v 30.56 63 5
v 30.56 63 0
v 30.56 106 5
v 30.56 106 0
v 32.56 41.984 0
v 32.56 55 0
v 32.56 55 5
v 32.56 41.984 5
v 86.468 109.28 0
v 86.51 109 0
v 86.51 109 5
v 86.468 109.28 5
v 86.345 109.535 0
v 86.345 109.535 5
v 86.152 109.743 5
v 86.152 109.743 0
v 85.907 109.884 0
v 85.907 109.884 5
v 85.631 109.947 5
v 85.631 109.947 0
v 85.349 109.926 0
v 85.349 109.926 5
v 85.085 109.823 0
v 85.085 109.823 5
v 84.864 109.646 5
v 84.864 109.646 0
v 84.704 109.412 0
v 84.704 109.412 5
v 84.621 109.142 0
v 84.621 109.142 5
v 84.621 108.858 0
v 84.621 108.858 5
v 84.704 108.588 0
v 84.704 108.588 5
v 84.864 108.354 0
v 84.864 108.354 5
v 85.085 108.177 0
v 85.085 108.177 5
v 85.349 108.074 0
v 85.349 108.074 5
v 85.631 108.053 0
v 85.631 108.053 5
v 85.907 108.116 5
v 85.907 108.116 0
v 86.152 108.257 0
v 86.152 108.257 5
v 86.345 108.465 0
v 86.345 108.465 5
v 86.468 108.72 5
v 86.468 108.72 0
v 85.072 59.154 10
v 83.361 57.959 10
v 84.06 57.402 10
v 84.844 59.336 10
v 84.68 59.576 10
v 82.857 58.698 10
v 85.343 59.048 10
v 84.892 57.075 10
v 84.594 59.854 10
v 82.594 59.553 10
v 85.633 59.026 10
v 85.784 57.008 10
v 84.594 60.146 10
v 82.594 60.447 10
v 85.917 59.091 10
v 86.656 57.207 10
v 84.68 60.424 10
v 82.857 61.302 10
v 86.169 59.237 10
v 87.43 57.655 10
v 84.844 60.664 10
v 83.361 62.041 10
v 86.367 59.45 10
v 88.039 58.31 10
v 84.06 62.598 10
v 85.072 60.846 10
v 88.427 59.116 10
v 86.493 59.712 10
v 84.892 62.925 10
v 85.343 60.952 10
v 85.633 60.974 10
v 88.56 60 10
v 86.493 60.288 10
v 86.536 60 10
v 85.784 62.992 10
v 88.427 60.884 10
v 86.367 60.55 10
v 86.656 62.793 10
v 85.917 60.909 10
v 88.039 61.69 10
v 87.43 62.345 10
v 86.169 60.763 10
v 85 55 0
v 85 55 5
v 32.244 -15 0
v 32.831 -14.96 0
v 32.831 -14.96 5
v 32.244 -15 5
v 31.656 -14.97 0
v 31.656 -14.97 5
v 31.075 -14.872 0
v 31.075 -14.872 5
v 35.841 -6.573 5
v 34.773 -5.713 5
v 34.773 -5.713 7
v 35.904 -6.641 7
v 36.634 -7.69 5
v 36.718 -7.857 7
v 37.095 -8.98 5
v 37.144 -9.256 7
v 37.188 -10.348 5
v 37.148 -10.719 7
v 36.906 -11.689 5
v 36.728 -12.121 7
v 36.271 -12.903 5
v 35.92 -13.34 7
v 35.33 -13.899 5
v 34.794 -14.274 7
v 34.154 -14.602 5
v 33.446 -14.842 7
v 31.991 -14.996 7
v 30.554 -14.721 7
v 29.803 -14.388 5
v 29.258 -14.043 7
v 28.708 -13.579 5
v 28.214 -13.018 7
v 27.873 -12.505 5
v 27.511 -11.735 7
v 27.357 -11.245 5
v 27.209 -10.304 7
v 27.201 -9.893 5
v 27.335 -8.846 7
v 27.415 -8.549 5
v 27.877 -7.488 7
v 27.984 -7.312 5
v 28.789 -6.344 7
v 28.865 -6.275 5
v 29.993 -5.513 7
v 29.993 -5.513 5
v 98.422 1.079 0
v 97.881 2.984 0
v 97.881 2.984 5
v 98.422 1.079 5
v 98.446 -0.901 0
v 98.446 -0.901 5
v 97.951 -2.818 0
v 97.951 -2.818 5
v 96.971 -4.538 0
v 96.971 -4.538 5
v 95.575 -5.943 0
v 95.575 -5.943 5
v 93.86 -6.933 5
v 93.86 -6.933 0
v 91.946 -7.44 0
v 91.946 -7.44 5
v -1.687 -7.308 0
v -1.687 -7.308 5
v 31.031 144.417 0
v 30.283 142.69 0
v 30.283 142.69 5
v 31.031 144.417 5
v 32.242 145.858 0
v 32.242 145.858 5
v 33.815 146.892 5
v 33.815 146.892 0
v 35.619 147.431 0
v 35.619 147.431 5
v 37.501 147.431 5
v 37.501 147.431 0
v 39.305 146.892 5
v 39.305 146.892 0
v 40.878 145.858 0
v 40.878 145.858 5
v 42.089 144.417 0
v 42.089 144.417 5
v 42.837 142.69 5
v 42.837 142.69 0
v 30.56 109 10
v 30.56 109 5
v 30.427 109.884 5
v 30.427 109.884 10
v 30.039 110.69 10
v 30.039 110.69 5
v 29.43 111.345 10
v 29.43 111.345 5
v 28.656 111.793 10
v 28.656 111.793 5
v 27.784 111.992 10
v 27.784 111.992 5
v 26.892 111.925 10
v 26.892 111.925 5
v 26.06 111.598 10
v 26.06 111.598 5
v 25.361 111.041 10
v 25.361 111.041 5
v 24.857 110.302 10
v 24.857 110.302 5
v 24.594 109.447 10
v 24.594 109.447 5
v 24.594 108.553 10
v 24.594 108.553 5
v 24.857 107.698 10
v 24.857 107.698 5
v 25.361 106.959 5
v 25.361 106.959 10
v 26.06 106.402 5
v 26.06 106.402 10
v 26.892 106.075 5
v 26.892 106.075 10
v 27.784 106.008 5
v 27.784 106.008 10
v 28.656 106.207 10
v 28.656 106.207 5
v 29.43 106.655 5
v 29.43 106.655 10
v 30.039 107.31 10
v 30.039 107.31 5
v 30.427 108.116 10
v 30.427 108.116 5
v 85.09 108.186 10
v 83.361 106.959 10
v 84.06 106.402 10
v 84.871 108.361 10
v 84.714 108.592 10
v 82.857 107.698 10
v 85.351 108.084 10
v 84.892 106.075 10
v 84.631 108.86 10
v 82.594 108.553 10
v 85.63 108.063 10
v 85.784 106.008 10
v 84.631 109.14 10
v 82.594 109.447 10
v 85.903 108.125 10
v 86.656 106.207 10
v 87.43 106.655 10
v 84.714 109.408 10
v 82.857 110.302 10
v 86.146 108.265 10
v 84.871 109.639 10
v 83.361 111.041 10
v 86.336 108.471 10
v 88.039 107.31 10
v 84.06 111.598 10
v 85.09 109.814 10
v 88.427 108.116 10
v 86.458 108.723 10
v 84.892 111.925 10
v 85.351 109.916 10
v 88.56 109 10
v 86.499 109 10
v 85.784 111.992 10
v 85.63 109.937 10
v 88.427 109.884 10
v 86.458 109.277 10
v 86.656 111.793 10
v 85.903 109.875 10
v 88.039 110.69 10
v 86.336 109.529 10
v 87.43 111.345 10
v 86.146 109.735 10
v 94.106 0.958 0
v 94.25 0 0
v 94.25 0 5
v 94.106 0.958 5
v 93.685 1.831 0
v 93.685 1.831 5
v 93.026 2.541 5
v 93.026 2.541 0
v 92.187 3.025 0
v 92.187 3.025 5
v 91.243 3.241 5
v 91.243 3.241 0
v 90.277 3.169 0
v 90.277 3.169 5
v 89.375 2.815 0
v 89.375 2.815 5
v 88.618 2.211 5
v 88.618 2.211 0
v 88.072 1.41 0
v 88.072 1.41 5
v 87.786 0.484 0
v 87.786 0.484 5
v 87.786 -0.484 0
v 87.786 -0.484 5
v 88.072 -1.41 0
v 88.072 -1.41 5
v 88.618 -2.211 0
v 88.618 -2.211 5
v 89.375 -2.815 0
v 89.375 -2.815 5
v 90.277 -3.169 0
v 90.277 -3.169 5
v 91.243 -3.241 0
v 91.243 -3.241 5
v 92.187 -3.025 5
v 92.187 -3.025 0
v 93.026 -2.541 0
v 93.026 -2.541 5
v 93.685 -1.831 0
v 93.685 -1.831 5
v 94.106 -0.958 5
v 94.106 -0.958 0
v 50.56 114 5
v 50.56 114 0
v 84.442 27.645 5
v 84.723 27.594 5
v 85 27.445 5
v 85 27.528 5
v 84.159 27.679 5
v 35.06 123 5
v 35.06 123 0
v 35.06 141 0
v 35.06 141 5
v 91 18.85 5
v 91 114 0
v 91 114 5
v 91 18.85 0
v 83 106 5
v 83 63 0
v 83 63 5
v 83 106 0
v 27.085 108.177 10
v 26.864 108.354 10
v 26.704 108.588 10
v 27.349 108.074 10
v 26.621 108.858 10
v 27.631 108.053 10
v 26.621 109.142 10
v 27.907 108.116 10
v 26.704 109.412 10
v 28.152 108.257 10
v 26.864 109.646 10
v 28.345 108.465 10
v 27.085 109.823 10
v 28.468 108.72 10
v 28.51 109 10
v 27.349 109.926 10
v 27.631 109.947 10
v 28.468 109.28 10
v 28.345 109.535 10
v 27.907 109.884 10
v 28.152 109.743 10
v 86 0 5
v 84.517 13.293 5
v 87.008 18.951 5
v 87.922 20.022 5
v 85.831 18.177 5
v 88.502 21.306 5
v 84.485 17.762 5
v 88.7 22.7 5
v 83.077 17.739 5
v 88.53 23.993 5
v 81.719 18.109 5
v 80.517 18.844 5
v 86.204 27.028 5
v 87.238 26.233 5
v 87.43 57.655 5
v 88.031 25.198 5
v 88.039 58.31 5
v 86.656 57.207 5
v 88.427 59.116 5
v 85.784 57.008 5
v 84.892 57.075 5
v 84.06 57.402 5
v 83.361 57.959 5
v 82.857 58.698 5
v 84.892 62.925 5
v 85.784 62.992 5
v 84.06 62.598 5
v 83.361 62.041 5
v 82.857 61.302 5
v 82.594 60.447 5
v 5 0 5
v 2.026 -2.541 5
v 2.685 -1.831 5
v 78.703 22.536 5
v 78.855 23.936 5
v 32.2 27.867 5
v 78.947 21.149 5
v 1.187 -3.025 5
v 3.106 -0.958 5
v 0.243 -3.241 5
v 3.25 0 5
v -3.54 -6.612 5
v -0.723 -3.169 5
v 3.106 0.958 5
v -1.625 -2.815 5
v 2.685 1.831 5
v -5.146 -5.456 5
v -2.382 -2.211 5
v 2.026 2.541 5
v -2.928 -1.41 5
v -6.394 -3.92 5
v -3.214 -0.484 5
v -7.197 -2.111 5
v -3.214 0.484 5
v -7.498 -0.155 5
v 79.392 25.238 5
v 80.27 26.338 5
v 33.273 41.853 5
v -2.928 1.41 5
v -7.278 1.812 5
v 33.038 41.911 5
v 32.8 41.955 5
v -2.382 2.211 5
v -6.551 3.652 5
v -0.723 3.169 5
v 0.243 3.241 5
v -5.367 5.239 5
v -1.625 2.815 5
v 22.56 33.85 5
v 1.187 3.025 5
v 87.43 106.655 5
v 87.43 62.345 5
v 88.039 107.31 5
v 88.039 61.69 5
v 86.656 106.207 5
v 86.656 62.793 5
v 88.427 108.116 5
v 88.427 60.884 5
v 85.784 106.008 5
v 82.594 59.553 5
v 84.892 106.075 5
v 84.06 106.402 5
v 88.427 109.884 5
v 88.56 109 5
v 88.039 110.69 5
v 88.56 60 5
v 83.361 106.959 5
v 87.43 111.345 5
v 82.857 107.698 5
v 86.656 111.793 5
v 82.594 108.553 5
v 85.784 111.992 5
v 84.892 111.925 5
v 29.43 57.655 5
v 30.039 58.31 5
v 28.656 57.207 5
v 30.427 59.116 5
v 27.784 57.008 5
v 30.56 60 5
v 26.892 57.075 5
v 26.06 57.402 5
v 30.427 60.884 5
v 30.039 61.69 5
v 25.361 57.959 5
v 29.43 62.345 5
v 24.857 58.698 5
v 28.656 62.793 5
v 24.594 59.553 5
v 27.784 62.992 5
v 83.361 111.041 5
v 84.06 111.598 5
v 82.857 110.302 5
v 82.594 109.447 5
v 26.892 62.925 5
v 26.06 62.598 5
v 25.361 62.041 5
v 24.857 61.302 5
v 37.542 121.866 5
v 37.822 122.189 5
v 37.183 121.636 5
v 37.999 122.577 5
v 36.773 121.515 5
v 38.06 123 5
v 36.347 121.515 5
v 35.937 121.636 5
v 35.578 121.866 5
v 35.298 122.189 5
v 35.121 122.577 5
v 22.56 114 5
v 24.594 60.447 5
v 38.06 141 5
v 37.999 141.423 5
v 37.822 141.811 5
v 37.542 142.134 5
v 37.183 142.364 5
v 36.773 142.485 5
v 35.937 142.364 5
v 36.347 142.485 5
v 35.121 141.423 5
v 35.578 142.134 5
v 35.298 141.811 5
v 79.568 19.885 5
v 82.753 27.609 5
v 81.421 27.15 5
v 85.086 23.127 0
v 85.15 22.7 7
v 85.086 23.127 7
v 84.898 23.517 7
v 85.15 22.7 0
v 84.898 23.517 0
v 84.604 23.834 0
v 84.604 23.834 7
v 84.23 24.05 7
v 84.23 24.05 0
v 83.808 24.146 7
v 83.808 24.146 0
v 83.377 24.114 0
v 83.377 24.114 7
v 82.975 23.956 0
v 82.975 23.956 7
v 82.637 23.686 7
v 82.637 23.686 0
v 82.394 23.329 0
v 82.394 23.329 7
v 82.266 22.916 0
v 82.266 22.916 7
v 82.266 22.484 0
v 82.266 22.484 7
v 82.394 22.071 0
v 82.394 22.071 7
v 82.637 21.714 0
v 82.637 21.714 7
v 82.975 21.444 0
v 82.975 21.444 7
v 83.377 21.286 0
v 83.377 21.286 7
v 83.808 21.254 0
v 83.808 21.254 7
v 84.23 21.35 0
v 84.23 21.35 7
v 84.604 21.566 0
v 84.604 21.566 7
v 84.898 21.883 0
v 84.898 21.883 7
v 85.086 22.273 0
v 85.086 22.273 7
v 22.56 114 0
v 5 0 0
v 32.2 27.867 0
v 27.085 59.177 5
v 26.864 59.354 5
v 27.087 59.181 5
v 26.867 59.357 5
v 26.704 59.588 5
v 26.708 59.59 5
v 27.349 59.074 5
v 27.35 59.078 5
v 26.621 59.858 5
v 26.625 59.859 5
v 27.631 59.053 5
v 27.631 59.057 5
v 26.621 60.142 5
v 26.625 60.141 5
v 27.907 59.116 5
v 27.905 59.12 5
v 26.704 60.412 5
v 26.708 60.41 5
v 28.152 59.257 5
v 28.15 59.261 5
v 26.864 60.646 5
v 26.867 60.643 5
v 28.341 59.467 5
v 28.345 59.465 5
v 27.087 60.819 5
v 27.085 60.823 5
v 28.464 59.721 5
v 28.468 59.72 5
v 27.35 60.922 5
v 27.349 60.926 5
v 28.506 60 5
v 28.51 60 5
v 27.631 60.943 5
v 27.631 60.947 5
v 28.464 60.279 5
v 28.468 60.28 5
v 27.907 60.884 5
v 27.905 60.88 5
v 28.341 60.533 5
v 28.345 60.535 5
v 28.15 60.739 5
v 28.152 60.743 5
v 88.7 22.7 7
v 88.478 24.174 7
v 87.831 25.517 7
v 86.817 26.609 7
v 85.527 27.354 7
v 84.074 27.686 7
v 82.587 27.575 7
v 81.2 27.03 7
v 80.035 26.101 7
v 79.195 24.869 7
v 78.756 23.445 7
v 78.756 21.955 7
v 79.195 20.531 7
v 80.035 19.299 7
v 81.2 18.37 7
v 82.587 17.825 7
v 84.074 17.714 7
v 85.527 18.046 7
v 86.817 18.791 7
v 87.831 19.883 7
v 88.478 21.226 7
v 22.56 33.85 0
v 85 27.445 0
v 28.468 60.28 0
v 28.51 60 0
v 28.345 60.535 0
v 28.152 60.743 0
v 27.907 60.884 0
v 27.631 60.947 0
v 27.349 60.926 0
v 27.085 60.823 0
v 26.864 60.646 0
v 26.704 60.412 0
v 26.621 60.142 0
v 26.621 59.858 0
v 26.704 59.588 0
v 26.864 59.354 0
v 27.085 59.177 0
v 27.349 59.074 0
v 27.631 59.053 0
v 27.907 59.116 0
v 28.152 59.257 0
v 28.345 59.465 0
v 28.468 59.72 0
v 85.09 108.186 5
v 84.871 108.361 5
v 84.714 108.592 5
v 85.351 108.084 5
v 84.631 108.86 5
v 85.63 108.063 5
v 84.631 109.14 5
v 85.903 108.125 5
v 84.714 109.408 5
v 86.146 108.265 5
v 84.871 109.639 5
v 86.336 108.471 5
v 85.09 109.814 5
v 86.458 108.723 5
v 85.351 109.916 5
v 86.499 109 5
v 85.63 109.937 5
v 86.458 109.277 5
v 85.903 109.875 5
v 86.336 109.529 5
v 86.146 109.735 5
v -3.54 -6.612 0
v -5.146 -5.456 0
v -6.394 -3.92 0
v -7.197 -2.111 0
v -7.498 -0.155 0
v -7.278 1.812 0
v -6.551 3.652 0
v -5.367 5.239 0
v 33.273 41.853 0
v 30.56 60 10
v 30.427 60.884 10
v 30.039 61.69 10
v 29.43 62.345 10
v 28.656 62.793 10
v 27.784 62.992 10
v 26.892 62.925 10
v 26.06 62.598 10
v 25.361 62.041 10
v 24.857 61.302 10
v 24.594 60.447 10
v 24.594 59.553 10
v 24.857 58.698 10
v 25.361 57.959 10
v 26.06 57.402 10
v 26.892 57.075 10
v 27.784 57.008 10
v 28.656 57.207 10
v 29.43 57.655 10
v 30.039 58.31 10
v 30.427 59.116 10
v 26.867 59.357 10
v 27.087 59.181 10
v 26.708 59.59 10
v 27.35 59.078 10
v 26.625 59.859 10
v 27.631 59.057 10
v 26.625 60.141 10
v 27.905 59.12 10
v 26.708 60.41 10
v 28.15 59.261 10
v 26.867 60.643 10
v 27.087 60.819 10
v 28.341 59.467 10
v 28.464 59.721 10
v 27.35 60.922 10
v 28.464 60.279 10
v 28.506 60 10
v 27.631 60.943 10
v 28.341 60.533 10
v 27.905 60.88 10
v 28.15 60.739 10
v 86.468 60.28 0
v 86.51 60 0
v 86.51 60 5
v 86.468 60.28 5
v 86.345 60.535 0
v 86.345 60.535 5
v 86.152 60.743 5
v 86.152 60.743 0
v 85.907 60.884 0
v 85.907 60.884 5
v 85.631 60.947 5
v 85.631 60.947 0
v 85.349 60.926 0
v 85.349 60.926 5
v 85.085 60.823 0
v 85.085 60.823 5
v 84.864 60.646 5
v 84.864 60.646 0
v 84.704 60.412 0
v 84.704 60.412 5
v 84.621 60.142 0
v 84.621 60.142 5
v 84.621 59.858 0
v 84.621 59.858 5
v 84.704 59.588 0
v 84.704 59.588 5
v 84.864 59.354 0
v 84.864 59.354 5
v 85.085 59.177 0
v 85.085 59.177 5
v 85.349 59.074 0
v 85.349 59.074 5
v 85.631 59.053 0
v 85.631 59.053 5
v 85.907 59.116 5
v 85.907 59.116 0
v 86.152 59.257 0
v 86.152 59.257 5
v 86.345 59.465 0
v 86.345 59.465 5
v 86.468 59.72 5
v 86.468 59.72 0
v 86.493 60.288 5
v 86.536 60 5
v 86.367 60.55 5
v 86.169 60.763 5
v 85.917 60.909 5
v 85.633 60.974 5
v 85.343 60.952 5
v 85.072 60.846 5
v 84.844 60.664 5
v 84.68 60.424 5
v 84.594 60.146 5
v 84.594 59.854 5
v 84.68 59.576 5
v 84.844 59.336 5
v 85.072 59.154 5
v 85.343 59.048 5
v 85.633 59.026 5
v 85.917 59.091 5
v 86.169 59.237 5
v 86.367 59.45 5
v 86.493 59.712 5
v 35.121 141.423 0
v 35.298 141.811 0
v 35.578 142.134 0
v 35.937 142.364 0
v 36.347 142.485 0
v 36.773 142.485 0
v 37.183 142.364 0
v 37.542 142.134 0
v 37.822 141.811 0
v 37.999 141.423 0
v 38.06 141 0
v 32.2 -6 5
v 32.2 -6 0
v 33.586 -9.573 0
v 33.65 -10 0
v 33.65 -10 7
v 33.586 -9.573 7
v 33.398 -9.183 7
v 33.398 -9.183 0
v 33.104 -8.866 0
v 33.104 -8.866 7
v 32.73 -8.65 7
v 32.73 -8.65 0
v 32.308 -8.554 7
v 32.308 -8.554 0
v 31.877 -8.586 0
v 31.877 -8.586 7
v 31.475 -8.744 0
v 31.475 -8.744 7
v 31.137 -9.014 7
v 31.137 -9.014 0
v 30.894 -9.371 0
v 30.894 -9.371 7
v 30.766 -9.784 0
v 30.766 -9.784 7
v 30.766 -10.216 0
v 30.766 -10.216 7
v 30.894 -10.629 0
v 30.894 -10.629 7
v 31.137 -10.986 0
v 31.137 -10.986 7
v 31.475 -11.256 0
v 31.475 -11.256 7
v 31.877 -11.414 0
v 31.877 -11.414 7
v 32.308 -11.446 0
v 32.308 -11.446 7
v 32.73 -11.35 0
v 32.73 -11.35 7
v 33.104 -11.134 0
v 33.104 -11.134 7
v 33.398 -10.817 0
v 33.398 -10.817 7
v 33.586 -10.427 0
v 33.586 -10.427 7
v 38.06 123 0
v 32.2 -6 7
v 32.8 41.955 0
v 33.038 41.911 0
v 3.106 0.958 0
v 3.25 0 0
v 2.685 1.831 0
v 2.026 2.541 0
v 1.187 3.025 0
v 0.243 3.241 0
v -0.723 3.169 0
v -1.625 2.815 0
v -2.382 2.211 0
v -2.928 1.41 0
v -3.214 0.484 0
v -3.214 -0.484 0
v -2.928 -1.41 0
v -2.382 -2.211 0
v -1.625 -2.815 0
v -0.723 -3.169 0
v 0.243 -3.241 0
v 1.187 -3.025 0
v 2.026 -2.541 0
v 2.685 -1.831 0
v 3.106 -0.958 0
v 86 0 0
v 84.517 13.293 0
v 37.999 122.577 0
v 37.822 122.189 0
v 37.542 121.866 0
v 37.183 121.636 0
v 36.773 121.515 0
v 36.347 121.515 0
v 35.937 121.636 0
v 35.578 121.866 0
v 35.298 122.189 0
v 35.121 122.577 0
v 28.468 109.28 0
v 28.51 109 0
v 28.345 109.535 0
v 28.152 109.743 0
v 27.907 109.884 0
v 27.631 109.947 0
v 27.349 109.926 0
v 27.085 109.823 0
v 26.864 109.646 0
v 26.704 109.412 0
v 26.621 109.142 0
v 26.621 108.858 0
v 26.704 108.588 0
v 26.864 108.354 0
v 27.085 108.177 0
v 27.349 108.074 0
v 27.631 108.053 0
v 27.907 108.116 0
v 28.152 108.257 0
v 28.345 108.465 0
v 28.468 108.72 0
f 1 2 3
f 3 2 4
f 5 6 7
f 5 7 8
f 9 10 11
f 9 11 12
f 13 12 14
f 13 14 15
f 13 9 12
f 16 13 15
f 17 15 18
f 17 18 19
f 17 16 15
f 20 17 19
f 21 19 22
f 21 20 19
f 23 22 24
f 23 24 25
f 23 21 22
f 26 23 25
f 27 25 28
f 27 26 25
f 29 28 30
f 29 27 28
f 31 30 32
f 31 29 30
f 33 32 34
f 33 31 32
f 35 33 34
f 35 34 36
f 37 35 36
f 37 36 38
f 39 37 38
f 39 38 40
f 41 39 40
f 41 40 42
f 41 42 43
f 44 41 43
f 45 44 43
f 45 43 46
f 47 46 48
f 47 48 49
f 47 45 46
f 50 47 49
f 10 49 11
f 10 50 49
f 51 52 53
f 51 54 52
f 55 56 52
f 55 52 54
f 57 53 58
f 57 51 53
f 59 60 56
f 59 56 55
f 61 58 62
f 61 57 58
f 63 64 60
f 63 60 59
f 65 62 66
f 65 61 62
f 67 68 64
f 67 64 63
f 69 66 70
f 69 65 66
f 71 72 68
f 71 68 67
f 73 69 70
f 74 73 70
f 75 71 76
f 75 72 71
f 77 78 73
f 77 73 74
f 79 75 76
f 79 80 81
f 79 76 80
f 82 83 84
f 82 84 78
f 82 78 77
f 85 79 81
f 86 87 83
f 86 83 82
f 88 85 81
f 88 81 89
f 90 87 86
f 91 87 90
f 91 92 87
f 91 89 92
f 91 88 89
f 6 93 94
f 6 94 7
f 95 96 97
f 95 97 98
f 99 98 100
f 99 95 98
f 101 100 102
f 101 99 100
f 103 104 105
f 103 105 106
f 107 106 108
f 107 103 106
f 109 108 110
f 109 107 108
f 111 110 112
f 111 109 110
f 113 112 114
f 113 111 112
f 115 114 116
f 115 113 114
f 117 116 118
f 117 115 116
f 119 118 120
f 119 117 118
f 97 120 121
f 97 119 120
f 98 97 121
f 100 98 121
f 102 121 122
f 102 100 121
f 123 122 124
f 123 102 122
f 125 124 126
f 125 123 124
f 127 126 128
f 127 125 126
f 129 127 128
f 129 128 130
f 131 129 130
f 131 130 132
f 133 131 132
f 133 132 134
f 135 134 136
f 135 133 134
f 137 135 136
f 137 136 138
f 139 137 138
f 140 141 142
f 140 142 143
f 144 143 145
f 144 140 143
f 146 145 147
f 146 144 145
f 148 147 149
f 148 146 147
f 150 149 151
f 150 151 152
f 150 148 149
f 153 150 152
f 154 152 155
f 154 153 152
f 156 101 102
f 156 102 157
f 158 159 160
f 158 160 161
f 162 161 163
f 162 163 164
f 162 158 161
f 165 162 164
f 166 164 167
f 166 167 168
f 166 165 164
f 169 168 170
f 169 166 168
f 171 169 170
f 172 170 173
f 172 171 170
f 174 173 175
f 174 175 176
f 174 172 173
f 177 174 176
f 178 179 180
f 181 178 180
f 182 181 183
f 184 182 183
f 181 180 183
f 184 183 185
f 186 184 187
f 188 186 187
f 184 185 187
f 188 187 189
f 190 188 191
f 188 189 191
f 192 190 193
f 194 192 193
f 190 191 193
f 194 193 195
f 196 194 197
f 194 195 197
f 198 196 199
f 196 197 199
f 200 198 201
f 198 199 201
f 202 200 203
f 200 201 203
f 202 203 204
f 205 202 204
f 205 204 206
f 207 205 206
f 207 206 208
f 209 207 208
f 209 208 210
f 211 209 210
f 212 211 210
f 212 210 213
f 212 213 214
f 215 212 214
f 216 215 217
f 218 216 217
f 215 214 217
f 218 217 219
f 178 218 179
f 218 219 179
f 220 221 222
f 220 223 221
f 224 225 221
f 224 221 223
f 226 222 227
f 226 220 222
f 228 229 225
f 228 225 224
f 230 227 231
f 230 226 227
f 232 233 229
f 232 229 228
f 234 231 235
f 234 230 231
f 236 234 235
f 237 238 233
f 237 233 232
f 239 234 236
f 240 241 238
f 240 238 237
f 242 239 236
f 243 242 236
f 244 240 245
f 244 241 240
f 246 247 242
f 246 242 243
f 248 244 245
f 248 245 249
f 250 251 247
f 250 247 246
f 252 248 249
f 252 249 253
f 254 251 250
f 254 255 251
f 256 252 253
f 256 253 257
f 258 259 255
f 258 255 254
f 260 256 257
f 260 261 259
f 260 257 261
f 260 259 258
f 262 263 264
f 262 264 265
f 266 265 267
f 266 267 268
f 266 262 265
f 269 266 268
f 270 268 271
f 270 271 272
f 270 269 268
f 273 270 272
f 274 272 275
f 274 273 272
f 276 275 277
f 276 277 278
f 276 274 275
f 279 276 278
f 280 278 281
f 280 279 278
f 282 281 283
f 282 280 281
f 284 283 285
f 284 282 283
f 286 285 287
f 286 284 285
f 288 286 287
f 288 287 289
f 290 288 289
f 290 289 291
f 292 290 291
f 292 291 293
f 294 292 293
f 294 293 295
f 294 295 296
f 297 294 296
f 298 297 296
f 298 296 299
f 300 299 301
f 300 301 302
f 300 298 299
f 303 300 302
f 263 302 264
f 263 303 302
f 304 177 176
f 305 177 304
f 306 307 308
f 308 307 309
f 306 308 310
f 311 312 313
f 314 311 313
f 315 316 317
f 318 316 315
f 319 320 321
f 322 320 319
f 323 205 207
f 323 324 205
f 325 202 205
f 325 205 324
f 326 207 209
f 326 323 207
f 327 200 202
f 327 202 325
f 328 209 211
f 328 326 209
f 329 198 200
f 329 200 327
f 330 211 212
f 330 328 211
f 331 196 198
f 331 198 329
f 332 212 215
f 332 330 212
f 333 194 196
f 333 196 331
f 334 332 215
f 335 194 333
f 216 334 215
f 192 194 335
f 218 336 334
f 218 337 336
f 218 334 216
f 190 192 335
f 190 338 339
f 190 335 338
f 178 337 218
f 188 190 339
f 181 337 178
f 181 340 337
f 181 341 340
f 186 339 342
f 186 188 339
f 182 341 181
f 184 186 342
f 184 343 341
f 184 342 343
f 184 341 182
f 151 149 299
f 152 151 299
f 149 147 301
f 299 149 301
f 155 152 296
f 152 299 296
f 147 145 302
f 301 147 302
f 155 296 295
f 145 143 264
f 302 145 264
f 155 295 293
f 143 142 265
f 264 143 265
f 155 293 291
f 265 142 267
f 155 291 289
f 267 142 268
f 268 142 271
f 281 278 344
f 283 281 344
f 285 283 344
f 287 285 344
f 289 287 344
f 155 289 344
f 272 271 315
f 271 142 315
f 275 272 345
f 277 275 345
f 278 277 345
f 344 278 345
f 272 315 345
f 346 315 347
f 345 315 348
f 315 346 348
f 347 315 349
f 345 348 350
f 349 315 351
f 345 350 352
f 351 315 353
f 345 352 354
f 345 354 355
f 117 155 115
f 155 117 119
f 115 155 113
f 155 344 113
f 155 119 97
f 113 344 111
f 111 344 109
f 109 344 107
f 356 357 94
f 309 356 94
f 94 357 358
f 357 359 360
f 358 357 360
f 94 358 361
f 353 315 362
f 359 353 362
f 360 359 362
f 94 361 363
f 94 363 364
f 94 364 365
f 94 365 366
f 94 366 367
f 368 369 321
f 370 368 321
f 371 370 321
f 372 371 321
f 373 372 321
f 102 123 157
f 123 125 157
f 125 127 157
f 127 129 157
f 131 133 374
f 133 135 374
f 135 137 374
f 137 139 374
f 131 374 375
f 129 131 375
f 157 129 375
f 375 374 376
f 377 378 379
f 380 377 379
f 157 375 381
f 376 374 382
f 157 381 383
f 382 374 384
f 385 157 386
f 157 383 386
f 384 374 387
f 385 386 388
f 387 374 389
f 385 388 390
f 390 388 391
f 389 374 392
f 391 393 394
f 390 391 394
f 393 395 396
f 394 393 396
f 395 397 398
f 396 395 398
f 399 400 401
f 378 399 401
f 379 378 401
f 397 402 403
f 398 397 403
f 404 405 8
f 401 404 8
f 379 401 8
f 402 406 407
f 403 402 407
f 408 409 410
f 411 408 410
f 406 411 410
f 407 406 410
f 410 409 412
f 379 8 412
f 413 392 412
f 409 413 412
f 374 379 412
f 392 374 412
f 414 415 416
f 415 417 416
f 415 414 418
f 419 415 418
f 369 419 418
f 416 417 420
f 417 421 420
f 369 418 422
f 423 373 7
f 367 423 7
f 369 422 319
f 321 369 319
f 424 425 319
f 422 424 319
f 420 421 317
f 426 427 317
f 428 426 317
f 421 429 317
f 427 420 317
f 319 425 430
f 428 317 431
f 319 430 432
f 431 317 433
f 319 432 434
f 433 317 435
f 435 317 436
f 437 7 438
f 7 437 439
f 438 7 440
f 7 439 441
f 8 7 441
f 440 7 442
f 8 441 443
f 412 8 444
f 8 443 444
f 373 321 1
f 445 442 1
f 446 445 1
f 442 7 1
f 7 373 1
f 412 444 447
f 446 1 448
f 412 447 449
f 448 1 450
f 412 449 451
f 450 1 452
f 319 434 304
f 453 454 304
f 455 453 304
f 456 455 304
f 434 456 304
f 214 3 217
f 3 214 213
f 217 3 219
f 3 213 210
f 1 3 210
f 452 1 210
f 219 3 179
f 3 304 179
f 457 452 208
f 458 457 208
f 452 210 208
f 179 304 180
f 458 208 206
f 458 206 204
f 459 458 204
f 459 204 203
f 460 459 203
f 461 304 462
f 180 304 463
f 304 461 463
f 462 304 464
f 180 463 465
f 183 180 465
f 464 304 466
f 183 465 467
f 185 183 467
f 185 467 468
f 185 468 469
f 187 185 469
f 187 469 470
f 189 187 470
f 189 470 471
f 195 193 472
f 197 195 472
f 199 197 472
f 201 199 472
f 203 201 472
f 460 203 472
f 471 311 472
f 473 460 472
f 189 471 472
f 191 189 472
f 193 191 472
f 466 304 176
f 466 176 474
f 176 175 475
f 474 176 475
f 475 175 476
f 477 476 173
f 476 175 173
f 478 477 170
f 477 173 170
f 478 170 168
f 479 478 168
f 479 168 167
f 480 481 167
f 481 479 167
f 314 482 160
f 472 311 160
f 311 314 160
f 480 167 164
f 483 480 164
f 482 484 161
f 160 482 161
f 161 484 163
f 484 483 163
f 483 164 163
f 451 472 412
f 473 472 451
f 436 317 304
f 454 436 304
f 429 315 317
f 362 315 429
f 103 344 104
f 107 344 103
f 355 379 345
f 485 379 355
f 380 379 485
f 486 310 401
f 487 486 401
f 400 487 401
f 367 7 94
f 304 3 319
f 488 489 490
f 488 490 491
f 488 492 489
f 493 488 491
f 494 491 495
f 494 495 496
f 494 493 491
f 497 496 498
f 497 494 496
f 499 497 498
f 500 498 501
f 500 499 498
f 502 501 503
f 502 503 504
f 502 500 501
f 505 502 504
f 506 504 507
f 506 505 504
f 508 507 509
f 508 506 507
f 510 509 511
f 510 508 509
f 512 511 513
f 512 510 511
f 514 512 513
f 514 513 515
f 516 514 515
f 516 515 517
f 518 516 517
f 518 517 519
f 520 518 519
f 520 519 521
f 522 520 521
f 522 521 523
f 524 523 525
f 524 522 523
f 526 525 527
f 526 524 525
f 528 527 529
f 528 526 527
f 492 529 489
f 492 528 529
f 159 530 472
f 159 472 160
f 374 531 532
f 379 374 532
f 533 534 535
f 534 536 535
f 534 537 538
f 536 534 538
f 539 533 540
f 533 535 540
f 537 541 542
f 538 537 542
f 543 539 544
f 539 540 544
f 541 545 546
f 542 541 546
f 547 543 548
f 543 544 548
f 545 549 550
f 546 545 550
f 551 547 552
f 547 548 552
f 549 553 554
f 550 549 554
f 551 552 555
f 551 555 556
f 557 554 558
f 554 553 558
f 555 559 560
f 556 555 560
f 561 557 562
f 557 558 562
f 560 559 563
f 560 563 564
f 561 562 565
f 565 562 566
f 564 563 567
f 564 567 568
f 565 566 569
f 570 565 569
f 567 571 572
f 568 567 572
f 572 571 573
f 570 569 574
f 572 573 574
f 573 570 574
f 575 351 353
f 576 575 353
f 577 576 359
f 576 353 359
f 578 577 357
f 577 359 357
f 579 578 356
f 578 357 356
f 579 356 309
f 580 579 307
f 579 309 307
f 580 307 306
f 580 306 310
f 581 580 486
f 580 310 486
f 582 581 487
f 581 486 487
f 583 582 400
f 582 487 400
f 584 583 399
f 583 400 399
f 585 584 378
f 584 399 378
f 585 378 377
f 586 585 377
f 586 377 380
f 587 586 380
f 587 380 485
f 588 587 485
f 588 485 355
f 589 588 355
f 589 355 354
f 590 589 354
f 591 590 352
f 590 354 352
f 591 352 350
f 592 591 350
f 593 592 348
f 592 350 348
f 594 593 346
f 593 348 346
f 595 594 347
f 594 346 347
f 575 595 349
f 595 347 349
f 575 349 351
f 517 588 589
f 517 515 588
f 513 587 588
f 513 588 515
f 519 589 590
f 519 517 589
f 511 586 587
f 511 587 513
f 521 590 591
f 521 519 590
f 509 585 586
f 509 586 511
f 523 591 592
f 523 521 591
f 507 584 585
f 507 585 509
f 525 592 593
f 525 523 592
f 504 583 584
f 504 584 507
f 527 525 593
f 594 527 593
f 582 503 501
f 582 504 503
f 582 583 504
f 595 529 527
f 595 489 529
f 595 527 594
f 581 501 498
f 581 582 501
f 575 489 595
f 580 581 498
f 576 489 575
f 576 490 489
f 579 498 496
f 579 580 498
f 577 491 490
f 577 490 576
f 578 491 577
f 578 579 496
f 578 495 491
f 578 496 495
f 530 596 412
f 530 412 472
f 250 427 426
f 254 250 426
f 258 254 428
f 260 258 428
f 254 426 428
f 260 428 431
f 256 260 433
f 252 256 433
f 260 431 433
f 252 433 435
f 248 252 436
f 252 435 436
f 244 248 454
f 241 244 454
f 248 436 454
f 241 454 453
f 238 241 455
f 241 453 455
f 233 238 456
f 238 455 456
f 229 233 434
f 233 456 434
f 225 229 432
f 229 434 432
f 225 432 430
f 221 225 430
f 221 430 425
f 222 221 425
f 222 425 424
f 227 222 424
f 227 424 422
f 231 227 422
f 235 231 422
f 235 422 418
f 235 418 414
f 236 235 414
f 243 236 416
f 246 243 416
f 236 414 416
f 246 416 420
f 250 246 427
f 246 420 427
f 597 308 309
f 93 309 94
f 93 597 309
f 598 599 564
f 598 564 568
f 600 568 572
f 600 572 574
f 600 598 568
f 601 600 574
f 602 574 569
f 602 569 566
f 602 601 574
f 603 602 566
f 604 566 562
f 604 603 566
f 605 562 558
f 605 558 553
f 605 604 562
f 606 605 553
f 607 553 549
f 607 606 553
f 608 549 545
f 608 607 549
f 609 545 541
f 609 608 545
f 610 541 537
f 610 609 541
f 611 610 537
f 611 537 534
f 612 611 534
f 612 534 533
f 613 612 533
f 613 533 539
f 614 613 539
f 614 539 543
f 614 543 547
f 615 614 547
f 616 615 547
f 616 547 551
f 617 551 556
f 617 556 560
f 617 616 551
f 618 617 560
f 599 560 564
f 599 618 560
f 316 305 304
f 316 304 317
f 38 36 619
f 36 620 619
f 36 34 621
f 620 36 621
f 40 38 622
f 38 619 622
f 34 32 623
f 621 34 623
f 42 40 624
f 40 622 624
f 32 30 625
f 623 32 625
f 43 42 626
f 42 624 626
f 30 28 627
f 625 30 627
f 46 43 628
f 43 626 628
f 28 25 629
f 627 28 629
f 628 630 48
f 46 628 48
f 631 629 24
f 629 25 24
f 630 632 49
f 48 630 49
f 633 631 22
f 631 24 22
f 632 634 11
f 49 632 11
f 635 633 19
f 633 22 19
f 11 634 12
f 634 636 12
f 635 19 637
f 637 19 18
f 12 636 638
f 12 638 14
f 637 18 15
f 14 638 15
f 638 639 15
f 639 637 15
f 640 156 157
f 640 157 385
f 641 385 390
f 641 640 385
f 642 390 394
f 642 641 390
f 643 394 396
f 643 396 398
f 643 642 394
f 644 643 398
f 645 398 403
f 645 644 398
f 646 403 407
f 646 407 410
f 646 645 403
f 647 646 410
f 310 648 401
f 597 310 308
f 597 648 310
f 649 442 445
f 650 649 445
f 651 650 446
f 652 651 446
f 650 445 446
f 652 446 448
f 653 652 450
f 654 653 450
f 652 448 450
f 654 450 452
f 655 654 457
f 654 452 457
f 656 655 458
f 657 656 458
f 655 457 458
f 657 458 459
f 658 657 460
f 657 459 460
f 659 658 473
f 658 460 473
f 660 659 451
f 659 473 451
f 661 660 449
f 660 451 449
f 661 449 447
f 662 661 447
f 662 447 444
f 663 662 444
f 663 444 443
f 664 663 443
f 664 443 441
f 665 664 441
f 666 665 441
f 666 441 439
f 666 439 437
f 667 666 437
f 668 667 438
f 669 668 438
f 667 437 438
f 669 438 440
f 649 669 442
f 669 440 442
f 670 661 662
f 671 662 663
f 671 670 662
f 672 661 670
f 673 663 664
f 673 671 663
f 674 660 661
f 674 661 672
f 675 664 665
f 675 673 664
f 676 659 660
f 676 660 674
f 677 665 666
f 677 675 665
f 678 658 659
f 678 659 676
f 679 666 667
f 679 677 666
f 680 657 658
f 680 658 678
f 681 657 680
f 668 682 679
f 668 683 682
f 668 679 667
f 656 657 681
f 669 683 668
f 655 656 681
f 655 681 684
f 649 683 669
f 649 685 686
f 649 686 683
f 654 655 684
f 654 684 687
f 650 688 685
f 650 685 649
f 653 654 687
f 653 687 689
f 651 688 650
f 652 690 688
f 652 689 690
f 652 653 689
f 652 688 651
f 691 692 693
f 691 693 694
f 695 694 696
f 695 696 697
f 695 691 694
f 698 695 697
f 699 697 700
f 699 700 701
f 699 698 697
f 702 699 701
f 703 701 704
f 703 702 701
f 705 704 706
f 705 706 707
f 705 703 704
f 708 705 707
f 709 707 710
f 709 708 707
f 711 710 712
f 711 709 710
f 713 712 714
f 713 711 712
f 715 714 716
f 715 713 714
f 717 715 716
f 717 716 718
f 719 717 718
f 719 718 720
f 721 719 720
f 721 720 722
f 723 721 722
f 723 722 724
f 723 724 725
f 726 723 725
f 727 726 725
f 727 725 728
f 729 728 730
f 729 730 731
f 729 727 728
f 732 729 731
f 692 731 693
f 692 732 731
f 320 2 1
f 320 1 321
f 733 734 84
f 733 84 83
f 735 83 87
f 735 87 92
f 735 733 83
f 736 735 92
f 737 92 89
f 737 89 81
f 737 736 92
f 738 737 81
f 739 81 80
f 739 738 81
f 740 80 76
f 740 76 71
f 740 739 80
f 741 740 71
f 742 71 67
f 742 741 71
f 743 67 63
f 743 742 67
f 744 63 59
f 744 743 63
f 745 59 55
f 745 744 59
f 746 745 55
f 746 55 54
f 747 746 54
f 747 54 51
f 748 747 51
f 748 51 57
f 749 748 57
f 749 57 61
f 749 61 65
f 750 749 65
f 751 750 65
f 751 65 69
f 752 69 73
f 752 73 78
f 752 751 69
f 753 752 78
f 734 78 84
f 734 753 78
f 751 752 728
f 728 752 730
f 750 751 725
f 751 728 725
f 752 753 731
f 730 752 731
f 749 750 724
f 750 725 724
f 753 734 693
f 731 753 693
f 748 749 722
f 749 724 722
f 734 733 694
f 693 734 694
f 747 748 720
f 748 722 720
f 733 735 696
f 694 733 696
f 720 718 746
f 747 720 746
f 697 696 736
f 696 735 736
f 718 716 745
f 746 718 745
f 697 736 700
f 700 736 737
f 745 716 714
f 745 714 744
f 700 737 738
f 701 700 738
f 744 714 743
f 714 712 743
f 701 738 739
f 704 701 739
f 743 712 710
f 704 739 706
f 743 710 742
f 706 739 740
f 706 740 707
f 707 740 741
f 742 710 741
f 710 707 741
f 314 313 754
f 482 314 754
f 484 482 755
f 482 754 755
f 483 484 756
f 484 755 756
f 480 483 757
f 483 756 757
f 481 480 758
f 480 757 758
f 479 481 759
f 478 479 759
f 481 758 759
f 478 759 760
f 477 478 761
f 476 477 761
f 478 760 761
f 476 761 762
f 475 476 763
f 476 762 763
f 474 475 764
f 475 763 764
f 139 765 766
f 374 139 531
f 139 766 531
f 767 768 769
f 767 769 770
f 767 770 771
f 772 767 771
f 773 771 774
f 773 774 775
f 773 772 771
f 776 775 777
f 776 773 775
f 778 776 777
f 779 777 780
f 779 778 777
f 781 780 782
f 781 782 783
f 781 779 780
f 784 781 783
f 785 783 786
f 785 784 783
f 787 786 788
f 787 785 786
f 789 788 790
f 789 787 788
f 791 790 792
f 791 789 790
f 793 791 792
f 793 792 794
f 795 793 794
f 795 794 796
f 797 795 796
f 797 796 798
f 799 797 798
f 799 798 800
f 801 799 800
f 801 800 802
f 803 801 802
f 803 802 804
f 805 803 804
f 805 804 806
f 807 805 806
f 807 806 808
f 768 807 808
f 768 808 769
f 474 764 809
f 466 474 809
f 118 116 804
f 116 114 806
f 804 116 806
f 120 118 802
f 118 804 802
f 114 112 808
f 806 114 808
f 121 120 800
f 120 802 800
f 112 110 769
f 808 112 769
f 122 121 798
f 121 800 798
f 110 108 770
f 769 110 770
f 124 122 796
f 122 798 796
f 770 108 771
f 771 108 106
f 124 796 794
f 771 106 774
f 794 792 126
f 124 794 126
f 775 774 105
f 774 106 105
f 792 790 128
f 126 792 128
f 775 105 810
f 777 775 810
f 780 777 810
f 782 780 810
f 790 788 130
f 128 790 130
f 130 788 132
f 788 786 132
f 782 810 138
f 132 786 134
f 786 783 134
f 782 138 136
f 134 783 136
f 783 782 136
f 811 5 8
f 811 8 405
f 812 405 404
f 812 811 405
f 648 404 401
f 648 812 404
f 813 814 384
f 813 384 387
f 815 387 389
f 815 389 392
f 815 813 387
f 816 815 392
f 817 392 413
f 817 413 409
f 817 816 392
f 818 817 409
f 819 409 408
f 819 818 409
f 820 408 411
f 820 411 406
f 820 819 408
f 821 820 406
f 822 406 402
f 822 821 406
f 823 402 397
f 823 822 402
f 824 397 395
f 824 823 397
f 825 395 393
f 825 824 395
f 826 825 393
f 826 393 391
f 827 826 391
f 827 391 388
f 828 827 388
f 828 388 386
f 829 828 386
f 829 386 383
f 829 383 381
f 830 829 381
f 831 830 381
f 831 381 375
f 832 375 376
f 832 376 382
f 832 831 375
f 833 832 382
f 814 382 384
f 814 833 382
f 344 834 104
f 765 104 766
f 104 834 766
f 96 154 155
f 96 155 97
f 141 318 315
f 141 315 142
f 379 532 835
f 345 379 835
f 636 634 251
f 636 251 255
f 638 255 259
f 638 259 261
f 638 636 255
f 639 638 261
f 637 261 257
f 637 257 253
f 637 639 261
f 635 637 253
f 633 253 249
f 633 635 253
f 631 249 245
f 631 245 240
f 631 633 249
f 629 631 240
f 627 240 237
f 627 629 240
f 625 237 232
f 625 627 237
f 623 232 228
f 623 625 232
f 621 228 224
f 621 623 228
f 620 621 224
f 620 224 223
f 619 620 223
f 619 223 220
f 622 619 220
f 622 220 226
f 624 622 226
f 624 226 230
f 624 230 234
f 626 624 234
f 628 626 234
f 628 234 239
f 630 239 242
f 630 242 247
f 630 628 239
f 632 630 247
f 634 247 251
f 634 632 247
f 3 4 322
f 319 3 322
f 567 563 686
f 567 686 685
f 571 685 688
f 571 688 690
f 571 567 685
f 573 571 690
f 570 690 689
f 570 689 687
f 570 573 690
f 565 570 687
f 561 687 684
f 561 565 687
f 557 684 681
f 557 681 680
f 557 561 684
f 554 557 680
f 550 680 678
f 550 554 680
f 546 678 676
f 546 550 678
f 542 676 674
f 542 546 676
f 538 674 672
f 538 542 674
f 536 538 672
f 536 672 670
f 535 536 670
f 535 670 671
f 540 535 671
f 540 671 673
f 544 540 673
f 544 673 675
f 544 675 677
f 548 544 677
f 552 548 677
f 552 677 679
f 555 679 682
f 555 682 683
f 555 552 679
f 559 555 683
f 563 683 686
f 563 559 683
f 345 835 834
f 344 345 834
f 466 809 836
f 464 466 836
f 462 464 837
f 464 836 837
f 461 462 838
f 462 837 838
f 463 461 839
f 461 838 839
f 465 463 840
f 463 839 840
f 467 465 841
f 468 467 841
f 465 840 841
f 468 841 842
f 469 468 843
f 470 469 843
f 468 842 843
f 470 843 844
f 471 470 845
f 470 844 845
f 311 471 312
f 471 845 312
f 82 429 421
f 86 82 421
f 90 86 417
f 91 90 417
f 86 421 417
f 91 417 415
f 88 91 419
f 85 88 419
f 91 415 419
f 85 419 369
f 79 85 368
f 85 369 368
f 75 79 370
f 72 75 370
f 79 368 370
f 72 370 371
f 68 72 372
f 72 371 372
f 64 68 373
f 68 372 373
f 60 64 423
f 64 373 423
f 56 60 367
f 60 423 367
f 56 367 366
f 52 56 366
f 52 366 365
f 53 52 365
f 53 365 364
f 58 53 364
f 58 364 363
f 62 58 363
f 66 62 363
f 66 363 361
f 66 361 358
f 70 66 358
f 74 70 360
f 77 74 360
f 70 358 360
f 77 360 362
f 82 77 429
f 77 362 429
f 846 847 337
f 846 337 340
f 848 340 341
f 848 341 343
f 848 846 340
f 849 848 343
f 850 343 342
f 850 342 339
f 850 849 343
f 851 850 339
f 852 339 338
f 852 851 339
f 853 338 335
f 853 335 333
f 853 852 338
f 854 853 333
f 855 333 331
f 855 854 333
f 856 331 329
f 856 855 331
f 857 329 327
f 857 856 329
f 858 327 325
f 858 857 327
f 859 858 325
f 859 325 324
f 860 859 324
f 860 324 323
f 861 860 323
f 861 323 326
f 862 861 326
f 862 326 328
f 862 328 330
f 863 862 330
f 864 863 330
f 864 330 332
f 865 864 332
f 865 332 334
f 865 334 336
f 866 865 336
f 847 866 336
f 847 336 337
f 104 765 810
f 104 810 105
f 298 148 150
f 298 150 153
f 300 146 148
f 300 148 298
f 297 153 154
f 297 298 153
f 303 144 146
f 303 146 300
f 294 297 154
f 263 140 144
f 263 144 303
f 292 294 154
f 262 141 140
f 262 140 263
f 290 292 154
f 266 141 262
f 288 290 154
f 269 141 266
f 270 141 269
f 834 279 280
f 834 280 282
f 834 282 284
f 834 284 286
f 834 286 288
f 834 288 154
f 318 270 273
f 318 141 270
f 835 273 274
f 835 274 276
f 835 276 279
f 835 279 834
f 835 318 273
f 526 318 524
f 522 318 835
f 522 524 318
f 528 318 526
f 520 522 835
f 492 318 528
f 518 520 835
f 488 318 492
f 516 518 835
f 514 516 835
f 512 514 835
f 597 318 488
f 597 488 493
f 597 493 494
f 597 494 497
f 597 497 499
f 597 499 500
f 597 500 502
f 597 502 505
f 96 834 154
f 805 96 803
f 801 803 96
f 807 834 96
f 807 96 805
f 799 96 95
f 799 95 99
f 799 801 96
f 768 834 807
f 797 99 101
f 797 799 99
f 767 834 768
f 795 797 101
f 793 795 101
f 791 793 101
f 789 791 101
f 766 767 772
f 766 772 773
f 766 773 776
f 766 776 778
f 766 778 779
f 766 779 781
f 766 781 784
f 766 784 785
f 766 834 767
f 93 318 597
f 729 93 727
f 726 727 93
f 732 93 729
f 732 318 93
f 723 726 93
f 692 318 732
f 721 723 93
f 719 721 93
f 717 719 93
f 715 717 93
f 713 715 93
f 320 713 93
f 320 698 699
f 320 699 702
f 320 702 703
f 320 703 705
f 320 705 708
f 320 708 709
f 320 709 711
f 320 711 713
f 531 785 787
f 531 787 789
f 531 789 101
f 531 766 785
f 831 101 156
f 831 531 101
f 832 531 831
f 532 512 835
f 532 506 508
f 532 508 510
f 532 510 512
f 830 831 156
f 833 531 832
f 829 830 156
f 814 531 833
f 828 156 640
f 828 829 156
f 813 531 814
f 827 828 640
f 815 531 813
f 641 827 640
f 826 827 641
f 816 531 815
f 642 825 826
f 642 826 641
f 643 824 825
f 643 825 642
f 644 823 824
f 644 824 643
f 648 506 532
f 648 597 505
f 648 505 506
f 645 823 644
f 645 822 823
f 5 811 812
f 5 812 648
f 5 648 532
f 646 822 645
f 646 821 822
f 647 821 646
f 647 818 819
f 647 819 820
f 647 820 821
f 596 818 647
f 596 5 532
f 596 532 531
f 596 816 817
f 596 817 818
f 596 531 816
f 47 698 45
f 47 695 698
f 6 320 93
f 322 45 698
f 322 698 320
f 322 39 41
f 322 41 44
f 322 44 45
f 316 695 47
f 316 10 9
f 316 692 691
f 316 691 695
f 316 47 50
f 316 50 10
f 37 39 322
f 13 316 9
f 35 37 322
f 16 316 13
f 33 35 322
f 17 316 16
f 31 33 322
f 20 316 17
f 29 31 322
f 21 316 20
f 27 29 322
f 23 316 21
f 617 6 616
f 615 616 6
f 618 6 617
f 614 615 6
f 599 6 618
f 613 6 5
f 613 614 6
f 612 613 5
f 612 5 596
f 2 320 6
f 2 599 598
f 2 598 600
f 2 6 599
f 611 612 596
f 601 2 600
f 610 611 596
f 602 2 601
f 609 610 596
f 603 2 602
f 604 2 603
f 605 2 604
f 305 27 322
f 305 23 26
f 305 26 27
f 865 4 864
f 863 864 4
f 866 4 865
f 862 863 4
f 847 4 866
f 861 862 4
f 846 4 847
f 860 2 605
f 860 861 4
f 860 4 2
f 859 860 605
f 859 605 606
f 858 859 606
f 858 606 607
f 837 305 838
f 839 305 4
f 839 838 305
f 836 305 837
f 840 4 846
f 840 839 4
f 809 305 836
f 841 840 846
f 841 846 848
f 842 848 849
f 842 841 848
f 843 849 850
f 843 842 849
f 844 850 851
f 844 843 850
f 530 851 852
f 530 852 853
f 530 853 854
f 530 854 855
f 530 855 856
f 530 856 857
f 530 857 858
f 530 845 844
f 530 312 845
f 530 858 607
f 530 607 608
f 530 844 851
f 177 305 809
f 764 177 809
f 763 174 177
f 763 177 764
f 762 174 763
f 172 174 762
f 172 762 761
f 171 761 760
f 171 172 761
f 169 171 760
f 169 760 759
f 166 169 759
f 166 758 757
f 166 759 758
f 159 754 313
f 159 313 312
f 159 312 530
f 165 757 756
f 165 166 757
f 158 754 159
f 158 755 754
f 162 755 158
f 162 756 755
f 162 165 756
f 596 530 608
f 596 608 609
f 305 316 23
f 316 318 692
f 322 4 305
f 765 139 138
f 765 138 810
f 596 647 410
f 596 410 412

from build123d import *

# Parameters (mm, degrees)
SKETCH1_R           = 3.25
SKETCH1_R_2         = 1.45
SKETCH1_R_3         = 0.95
SKETCH1_W           = 52.44
SKETCH1_H           = 43
BOSS_EXTRUDE1_DEPTH = 5
SKETCH2_R           = 5
SKETCH2_R_2         = 1.45
BOSS_EXTRUDE2_DEPTH = 2
SKETCH3_R           = 3
SKETCH3_R_2         = 0.945605266
SKETCH3_R_3         = 0.976454059
SKETCH3_R_4         = 0.939469919
SKETCH3_R_5         = 0.95
BOSS_EXTRUDE3_DEPTH = 5


with BuildPart() as part:
    # Sketch1 → Boss-Extrude1 (new body)
    with BuildSketch(Plane.XY):
        with BuildLine():
            Line((-5.367112971, 5.238711517), (22.56, 33.850321407))
            Line((22.56, 33.850321407), (22.56, 114))
            Line((22.56, 114), (30.283459854, 142.689687483))
            ThreePointArc((30.283459854, 142.689687483), (36.56, 147.5), (42.836540146, 142.689687483))
            Line((42.836540146, 142.689687483), (50.56, 114))
            Line((50.56, 114), (91, 114))
            Line((91, 114), (91, 18.850321407))
            Line((91, 18.850321407), (97.880809624, 2.984034001))
            ThreePointArc((97.880809624, 2.984034001), (97.517806061, -3.71055308), (91.9464361, -7.440044268))
            Line((91.9464361, -7.440044268), (32.8309574, -14.960029512))
            ThreePointArc((32.8309574, -14.960029512), (31.949174794, -14.993704709), (31.075204637, -14.871841068))
            Line((31.075204637, -14.871841068), (-1.687193044, -7.307761602))
            ThreePointArc((-1.687193044, -7.307761602), (-7.196826055, -2.11085166), (-5.367112971, 5.238711517))
        make_face()
        Circle(SKETCH1_R, mode=Mode.SUBTRACT)
        with Locations((91, 0)):
            Circle(SKETCH1_R, mode=Mode.SUBTRACT)
        with Locations((32.2, -10)):
            Circle(SKETCH1_R_2, mode=Mode.SUBTRACT)
        with Locations((83.7, 22.7)):
            Circle(SKETCH1_R_2, mode=Mode.SUBTRACT)
        with Locations((27.56, 109)):
            Circle(SKETCH1_R_3, mode=Mode.SUBTRACT)
        with Locations((27.56, 60)):
            Circle(SKETCH1_R_3, mode=Mode.SUBTRACT)
        with Locations((85.56, 60)):
            Circle(SKETCH1_R_3, mode=Mode.SUBTRACT)
        with Locations((85.56, 109)):
            Circle(SKETCH1_R_3, mode=Mode.SUBTRACT)
        with BuildLine():
            Line((33.273349419, 41.853300017), (85, 27.444671021))
            Line((85, 27.444671021), (85, 55))
            Line((85, 55), (32.56, 55))
            Line((32.56, 55), (32.56, 41.983767061))
            ThreePointArc((32.56, 41.983767061), (32.919637445, 41.934732767), (33.273349419, 41.853300017))
        make_face(mode=Mode.SUBTRACT)
        with Locations((56.78, 84.5)):
            Rectangle(SKETCH1_W, SKETCH1_H, mode=Mode.SUBTRACT)
        Polygon((32.2, -6), (5, 0), (32.2, 27.866675292), (84.517456272, 13.293475424), (86, 0), align=None, mode=Mode.SUBTRACT)
        with BuildLine():
            Line((38.06, 141), (38.06, 123))
            ThreePointArc((38.06, 123), (36.56, 121.5), (35.06, 123))
            Line((35.06, 123), (35.06, 141))
            ThreePointArc((35.06, 141), (36.56, 142.5), (38.06, 141))
        make_face(mode=Mode.SUBTRACT)
    extrude(amount=BOSS_EXTRUDE1_DEPTH)

    # Sketch2 → Boss-Extrude2 (add)
    with BuildSketch(Plane.XY.offset(5)):
        with Locations((83.7, 22.7)):
            Circle(SKETCH2_R)
        with Locations((83.7, 22.7)):
            Circle(SKETCH2_R_2, mode=Mode.SUBTRACT)
        with BuildLine():
            Line((32.2, -6), (34.773281255, -5.71301696))
            ThreePointArc((34.773281255, -5.71301696), (31.991216079, -14.995639026), (29.993401427, -5.513250315))
            Line((29.993401427, -5.513250315), (32.2, -6))
        make_face()
        with Locations((32.2, -10)):
            Circle(SKETCH2_R_2, mode=Mode.SUBTRACT)
    extrude(amount=BOSS_EXTRUDE2_DEPTH)

    # Sketch3 → Boss-Extrude3 (add)
    with BuildSketch(Plane.XY.offset(5)):
        with Locations((27.56, 60)):
            Circle(SKETCH3_R)
        with Locations((27.56, 60)):
            Circle(SKETCH3_R_2, mode=Mode.SUBTRACT)
        with Locations((85.56, 60)):
            Circle(SKETCH3_R)
        with Locations((85.56, 60)):
            Circle(SKETCH3_R_3, mode=Mode.SUBTRACT)
        with Locations((85.56, 109)):
            Circle(SKETCH3_R)
        with Locations((85.56, 109)):
            Circle(SKETCH3_R_4, mode=Mode.SUBTRACT)
        with Locations((27.56, 109)):
            Circle(SKETCH3_R)
        with Locations((27.56, 109)):
            Circle(SKETCH3_R_5, mode=Mode.SUBTRACT)
    extrude(amount=BOSS_EXTRUDE3_DEPTH)


solid = part.part
